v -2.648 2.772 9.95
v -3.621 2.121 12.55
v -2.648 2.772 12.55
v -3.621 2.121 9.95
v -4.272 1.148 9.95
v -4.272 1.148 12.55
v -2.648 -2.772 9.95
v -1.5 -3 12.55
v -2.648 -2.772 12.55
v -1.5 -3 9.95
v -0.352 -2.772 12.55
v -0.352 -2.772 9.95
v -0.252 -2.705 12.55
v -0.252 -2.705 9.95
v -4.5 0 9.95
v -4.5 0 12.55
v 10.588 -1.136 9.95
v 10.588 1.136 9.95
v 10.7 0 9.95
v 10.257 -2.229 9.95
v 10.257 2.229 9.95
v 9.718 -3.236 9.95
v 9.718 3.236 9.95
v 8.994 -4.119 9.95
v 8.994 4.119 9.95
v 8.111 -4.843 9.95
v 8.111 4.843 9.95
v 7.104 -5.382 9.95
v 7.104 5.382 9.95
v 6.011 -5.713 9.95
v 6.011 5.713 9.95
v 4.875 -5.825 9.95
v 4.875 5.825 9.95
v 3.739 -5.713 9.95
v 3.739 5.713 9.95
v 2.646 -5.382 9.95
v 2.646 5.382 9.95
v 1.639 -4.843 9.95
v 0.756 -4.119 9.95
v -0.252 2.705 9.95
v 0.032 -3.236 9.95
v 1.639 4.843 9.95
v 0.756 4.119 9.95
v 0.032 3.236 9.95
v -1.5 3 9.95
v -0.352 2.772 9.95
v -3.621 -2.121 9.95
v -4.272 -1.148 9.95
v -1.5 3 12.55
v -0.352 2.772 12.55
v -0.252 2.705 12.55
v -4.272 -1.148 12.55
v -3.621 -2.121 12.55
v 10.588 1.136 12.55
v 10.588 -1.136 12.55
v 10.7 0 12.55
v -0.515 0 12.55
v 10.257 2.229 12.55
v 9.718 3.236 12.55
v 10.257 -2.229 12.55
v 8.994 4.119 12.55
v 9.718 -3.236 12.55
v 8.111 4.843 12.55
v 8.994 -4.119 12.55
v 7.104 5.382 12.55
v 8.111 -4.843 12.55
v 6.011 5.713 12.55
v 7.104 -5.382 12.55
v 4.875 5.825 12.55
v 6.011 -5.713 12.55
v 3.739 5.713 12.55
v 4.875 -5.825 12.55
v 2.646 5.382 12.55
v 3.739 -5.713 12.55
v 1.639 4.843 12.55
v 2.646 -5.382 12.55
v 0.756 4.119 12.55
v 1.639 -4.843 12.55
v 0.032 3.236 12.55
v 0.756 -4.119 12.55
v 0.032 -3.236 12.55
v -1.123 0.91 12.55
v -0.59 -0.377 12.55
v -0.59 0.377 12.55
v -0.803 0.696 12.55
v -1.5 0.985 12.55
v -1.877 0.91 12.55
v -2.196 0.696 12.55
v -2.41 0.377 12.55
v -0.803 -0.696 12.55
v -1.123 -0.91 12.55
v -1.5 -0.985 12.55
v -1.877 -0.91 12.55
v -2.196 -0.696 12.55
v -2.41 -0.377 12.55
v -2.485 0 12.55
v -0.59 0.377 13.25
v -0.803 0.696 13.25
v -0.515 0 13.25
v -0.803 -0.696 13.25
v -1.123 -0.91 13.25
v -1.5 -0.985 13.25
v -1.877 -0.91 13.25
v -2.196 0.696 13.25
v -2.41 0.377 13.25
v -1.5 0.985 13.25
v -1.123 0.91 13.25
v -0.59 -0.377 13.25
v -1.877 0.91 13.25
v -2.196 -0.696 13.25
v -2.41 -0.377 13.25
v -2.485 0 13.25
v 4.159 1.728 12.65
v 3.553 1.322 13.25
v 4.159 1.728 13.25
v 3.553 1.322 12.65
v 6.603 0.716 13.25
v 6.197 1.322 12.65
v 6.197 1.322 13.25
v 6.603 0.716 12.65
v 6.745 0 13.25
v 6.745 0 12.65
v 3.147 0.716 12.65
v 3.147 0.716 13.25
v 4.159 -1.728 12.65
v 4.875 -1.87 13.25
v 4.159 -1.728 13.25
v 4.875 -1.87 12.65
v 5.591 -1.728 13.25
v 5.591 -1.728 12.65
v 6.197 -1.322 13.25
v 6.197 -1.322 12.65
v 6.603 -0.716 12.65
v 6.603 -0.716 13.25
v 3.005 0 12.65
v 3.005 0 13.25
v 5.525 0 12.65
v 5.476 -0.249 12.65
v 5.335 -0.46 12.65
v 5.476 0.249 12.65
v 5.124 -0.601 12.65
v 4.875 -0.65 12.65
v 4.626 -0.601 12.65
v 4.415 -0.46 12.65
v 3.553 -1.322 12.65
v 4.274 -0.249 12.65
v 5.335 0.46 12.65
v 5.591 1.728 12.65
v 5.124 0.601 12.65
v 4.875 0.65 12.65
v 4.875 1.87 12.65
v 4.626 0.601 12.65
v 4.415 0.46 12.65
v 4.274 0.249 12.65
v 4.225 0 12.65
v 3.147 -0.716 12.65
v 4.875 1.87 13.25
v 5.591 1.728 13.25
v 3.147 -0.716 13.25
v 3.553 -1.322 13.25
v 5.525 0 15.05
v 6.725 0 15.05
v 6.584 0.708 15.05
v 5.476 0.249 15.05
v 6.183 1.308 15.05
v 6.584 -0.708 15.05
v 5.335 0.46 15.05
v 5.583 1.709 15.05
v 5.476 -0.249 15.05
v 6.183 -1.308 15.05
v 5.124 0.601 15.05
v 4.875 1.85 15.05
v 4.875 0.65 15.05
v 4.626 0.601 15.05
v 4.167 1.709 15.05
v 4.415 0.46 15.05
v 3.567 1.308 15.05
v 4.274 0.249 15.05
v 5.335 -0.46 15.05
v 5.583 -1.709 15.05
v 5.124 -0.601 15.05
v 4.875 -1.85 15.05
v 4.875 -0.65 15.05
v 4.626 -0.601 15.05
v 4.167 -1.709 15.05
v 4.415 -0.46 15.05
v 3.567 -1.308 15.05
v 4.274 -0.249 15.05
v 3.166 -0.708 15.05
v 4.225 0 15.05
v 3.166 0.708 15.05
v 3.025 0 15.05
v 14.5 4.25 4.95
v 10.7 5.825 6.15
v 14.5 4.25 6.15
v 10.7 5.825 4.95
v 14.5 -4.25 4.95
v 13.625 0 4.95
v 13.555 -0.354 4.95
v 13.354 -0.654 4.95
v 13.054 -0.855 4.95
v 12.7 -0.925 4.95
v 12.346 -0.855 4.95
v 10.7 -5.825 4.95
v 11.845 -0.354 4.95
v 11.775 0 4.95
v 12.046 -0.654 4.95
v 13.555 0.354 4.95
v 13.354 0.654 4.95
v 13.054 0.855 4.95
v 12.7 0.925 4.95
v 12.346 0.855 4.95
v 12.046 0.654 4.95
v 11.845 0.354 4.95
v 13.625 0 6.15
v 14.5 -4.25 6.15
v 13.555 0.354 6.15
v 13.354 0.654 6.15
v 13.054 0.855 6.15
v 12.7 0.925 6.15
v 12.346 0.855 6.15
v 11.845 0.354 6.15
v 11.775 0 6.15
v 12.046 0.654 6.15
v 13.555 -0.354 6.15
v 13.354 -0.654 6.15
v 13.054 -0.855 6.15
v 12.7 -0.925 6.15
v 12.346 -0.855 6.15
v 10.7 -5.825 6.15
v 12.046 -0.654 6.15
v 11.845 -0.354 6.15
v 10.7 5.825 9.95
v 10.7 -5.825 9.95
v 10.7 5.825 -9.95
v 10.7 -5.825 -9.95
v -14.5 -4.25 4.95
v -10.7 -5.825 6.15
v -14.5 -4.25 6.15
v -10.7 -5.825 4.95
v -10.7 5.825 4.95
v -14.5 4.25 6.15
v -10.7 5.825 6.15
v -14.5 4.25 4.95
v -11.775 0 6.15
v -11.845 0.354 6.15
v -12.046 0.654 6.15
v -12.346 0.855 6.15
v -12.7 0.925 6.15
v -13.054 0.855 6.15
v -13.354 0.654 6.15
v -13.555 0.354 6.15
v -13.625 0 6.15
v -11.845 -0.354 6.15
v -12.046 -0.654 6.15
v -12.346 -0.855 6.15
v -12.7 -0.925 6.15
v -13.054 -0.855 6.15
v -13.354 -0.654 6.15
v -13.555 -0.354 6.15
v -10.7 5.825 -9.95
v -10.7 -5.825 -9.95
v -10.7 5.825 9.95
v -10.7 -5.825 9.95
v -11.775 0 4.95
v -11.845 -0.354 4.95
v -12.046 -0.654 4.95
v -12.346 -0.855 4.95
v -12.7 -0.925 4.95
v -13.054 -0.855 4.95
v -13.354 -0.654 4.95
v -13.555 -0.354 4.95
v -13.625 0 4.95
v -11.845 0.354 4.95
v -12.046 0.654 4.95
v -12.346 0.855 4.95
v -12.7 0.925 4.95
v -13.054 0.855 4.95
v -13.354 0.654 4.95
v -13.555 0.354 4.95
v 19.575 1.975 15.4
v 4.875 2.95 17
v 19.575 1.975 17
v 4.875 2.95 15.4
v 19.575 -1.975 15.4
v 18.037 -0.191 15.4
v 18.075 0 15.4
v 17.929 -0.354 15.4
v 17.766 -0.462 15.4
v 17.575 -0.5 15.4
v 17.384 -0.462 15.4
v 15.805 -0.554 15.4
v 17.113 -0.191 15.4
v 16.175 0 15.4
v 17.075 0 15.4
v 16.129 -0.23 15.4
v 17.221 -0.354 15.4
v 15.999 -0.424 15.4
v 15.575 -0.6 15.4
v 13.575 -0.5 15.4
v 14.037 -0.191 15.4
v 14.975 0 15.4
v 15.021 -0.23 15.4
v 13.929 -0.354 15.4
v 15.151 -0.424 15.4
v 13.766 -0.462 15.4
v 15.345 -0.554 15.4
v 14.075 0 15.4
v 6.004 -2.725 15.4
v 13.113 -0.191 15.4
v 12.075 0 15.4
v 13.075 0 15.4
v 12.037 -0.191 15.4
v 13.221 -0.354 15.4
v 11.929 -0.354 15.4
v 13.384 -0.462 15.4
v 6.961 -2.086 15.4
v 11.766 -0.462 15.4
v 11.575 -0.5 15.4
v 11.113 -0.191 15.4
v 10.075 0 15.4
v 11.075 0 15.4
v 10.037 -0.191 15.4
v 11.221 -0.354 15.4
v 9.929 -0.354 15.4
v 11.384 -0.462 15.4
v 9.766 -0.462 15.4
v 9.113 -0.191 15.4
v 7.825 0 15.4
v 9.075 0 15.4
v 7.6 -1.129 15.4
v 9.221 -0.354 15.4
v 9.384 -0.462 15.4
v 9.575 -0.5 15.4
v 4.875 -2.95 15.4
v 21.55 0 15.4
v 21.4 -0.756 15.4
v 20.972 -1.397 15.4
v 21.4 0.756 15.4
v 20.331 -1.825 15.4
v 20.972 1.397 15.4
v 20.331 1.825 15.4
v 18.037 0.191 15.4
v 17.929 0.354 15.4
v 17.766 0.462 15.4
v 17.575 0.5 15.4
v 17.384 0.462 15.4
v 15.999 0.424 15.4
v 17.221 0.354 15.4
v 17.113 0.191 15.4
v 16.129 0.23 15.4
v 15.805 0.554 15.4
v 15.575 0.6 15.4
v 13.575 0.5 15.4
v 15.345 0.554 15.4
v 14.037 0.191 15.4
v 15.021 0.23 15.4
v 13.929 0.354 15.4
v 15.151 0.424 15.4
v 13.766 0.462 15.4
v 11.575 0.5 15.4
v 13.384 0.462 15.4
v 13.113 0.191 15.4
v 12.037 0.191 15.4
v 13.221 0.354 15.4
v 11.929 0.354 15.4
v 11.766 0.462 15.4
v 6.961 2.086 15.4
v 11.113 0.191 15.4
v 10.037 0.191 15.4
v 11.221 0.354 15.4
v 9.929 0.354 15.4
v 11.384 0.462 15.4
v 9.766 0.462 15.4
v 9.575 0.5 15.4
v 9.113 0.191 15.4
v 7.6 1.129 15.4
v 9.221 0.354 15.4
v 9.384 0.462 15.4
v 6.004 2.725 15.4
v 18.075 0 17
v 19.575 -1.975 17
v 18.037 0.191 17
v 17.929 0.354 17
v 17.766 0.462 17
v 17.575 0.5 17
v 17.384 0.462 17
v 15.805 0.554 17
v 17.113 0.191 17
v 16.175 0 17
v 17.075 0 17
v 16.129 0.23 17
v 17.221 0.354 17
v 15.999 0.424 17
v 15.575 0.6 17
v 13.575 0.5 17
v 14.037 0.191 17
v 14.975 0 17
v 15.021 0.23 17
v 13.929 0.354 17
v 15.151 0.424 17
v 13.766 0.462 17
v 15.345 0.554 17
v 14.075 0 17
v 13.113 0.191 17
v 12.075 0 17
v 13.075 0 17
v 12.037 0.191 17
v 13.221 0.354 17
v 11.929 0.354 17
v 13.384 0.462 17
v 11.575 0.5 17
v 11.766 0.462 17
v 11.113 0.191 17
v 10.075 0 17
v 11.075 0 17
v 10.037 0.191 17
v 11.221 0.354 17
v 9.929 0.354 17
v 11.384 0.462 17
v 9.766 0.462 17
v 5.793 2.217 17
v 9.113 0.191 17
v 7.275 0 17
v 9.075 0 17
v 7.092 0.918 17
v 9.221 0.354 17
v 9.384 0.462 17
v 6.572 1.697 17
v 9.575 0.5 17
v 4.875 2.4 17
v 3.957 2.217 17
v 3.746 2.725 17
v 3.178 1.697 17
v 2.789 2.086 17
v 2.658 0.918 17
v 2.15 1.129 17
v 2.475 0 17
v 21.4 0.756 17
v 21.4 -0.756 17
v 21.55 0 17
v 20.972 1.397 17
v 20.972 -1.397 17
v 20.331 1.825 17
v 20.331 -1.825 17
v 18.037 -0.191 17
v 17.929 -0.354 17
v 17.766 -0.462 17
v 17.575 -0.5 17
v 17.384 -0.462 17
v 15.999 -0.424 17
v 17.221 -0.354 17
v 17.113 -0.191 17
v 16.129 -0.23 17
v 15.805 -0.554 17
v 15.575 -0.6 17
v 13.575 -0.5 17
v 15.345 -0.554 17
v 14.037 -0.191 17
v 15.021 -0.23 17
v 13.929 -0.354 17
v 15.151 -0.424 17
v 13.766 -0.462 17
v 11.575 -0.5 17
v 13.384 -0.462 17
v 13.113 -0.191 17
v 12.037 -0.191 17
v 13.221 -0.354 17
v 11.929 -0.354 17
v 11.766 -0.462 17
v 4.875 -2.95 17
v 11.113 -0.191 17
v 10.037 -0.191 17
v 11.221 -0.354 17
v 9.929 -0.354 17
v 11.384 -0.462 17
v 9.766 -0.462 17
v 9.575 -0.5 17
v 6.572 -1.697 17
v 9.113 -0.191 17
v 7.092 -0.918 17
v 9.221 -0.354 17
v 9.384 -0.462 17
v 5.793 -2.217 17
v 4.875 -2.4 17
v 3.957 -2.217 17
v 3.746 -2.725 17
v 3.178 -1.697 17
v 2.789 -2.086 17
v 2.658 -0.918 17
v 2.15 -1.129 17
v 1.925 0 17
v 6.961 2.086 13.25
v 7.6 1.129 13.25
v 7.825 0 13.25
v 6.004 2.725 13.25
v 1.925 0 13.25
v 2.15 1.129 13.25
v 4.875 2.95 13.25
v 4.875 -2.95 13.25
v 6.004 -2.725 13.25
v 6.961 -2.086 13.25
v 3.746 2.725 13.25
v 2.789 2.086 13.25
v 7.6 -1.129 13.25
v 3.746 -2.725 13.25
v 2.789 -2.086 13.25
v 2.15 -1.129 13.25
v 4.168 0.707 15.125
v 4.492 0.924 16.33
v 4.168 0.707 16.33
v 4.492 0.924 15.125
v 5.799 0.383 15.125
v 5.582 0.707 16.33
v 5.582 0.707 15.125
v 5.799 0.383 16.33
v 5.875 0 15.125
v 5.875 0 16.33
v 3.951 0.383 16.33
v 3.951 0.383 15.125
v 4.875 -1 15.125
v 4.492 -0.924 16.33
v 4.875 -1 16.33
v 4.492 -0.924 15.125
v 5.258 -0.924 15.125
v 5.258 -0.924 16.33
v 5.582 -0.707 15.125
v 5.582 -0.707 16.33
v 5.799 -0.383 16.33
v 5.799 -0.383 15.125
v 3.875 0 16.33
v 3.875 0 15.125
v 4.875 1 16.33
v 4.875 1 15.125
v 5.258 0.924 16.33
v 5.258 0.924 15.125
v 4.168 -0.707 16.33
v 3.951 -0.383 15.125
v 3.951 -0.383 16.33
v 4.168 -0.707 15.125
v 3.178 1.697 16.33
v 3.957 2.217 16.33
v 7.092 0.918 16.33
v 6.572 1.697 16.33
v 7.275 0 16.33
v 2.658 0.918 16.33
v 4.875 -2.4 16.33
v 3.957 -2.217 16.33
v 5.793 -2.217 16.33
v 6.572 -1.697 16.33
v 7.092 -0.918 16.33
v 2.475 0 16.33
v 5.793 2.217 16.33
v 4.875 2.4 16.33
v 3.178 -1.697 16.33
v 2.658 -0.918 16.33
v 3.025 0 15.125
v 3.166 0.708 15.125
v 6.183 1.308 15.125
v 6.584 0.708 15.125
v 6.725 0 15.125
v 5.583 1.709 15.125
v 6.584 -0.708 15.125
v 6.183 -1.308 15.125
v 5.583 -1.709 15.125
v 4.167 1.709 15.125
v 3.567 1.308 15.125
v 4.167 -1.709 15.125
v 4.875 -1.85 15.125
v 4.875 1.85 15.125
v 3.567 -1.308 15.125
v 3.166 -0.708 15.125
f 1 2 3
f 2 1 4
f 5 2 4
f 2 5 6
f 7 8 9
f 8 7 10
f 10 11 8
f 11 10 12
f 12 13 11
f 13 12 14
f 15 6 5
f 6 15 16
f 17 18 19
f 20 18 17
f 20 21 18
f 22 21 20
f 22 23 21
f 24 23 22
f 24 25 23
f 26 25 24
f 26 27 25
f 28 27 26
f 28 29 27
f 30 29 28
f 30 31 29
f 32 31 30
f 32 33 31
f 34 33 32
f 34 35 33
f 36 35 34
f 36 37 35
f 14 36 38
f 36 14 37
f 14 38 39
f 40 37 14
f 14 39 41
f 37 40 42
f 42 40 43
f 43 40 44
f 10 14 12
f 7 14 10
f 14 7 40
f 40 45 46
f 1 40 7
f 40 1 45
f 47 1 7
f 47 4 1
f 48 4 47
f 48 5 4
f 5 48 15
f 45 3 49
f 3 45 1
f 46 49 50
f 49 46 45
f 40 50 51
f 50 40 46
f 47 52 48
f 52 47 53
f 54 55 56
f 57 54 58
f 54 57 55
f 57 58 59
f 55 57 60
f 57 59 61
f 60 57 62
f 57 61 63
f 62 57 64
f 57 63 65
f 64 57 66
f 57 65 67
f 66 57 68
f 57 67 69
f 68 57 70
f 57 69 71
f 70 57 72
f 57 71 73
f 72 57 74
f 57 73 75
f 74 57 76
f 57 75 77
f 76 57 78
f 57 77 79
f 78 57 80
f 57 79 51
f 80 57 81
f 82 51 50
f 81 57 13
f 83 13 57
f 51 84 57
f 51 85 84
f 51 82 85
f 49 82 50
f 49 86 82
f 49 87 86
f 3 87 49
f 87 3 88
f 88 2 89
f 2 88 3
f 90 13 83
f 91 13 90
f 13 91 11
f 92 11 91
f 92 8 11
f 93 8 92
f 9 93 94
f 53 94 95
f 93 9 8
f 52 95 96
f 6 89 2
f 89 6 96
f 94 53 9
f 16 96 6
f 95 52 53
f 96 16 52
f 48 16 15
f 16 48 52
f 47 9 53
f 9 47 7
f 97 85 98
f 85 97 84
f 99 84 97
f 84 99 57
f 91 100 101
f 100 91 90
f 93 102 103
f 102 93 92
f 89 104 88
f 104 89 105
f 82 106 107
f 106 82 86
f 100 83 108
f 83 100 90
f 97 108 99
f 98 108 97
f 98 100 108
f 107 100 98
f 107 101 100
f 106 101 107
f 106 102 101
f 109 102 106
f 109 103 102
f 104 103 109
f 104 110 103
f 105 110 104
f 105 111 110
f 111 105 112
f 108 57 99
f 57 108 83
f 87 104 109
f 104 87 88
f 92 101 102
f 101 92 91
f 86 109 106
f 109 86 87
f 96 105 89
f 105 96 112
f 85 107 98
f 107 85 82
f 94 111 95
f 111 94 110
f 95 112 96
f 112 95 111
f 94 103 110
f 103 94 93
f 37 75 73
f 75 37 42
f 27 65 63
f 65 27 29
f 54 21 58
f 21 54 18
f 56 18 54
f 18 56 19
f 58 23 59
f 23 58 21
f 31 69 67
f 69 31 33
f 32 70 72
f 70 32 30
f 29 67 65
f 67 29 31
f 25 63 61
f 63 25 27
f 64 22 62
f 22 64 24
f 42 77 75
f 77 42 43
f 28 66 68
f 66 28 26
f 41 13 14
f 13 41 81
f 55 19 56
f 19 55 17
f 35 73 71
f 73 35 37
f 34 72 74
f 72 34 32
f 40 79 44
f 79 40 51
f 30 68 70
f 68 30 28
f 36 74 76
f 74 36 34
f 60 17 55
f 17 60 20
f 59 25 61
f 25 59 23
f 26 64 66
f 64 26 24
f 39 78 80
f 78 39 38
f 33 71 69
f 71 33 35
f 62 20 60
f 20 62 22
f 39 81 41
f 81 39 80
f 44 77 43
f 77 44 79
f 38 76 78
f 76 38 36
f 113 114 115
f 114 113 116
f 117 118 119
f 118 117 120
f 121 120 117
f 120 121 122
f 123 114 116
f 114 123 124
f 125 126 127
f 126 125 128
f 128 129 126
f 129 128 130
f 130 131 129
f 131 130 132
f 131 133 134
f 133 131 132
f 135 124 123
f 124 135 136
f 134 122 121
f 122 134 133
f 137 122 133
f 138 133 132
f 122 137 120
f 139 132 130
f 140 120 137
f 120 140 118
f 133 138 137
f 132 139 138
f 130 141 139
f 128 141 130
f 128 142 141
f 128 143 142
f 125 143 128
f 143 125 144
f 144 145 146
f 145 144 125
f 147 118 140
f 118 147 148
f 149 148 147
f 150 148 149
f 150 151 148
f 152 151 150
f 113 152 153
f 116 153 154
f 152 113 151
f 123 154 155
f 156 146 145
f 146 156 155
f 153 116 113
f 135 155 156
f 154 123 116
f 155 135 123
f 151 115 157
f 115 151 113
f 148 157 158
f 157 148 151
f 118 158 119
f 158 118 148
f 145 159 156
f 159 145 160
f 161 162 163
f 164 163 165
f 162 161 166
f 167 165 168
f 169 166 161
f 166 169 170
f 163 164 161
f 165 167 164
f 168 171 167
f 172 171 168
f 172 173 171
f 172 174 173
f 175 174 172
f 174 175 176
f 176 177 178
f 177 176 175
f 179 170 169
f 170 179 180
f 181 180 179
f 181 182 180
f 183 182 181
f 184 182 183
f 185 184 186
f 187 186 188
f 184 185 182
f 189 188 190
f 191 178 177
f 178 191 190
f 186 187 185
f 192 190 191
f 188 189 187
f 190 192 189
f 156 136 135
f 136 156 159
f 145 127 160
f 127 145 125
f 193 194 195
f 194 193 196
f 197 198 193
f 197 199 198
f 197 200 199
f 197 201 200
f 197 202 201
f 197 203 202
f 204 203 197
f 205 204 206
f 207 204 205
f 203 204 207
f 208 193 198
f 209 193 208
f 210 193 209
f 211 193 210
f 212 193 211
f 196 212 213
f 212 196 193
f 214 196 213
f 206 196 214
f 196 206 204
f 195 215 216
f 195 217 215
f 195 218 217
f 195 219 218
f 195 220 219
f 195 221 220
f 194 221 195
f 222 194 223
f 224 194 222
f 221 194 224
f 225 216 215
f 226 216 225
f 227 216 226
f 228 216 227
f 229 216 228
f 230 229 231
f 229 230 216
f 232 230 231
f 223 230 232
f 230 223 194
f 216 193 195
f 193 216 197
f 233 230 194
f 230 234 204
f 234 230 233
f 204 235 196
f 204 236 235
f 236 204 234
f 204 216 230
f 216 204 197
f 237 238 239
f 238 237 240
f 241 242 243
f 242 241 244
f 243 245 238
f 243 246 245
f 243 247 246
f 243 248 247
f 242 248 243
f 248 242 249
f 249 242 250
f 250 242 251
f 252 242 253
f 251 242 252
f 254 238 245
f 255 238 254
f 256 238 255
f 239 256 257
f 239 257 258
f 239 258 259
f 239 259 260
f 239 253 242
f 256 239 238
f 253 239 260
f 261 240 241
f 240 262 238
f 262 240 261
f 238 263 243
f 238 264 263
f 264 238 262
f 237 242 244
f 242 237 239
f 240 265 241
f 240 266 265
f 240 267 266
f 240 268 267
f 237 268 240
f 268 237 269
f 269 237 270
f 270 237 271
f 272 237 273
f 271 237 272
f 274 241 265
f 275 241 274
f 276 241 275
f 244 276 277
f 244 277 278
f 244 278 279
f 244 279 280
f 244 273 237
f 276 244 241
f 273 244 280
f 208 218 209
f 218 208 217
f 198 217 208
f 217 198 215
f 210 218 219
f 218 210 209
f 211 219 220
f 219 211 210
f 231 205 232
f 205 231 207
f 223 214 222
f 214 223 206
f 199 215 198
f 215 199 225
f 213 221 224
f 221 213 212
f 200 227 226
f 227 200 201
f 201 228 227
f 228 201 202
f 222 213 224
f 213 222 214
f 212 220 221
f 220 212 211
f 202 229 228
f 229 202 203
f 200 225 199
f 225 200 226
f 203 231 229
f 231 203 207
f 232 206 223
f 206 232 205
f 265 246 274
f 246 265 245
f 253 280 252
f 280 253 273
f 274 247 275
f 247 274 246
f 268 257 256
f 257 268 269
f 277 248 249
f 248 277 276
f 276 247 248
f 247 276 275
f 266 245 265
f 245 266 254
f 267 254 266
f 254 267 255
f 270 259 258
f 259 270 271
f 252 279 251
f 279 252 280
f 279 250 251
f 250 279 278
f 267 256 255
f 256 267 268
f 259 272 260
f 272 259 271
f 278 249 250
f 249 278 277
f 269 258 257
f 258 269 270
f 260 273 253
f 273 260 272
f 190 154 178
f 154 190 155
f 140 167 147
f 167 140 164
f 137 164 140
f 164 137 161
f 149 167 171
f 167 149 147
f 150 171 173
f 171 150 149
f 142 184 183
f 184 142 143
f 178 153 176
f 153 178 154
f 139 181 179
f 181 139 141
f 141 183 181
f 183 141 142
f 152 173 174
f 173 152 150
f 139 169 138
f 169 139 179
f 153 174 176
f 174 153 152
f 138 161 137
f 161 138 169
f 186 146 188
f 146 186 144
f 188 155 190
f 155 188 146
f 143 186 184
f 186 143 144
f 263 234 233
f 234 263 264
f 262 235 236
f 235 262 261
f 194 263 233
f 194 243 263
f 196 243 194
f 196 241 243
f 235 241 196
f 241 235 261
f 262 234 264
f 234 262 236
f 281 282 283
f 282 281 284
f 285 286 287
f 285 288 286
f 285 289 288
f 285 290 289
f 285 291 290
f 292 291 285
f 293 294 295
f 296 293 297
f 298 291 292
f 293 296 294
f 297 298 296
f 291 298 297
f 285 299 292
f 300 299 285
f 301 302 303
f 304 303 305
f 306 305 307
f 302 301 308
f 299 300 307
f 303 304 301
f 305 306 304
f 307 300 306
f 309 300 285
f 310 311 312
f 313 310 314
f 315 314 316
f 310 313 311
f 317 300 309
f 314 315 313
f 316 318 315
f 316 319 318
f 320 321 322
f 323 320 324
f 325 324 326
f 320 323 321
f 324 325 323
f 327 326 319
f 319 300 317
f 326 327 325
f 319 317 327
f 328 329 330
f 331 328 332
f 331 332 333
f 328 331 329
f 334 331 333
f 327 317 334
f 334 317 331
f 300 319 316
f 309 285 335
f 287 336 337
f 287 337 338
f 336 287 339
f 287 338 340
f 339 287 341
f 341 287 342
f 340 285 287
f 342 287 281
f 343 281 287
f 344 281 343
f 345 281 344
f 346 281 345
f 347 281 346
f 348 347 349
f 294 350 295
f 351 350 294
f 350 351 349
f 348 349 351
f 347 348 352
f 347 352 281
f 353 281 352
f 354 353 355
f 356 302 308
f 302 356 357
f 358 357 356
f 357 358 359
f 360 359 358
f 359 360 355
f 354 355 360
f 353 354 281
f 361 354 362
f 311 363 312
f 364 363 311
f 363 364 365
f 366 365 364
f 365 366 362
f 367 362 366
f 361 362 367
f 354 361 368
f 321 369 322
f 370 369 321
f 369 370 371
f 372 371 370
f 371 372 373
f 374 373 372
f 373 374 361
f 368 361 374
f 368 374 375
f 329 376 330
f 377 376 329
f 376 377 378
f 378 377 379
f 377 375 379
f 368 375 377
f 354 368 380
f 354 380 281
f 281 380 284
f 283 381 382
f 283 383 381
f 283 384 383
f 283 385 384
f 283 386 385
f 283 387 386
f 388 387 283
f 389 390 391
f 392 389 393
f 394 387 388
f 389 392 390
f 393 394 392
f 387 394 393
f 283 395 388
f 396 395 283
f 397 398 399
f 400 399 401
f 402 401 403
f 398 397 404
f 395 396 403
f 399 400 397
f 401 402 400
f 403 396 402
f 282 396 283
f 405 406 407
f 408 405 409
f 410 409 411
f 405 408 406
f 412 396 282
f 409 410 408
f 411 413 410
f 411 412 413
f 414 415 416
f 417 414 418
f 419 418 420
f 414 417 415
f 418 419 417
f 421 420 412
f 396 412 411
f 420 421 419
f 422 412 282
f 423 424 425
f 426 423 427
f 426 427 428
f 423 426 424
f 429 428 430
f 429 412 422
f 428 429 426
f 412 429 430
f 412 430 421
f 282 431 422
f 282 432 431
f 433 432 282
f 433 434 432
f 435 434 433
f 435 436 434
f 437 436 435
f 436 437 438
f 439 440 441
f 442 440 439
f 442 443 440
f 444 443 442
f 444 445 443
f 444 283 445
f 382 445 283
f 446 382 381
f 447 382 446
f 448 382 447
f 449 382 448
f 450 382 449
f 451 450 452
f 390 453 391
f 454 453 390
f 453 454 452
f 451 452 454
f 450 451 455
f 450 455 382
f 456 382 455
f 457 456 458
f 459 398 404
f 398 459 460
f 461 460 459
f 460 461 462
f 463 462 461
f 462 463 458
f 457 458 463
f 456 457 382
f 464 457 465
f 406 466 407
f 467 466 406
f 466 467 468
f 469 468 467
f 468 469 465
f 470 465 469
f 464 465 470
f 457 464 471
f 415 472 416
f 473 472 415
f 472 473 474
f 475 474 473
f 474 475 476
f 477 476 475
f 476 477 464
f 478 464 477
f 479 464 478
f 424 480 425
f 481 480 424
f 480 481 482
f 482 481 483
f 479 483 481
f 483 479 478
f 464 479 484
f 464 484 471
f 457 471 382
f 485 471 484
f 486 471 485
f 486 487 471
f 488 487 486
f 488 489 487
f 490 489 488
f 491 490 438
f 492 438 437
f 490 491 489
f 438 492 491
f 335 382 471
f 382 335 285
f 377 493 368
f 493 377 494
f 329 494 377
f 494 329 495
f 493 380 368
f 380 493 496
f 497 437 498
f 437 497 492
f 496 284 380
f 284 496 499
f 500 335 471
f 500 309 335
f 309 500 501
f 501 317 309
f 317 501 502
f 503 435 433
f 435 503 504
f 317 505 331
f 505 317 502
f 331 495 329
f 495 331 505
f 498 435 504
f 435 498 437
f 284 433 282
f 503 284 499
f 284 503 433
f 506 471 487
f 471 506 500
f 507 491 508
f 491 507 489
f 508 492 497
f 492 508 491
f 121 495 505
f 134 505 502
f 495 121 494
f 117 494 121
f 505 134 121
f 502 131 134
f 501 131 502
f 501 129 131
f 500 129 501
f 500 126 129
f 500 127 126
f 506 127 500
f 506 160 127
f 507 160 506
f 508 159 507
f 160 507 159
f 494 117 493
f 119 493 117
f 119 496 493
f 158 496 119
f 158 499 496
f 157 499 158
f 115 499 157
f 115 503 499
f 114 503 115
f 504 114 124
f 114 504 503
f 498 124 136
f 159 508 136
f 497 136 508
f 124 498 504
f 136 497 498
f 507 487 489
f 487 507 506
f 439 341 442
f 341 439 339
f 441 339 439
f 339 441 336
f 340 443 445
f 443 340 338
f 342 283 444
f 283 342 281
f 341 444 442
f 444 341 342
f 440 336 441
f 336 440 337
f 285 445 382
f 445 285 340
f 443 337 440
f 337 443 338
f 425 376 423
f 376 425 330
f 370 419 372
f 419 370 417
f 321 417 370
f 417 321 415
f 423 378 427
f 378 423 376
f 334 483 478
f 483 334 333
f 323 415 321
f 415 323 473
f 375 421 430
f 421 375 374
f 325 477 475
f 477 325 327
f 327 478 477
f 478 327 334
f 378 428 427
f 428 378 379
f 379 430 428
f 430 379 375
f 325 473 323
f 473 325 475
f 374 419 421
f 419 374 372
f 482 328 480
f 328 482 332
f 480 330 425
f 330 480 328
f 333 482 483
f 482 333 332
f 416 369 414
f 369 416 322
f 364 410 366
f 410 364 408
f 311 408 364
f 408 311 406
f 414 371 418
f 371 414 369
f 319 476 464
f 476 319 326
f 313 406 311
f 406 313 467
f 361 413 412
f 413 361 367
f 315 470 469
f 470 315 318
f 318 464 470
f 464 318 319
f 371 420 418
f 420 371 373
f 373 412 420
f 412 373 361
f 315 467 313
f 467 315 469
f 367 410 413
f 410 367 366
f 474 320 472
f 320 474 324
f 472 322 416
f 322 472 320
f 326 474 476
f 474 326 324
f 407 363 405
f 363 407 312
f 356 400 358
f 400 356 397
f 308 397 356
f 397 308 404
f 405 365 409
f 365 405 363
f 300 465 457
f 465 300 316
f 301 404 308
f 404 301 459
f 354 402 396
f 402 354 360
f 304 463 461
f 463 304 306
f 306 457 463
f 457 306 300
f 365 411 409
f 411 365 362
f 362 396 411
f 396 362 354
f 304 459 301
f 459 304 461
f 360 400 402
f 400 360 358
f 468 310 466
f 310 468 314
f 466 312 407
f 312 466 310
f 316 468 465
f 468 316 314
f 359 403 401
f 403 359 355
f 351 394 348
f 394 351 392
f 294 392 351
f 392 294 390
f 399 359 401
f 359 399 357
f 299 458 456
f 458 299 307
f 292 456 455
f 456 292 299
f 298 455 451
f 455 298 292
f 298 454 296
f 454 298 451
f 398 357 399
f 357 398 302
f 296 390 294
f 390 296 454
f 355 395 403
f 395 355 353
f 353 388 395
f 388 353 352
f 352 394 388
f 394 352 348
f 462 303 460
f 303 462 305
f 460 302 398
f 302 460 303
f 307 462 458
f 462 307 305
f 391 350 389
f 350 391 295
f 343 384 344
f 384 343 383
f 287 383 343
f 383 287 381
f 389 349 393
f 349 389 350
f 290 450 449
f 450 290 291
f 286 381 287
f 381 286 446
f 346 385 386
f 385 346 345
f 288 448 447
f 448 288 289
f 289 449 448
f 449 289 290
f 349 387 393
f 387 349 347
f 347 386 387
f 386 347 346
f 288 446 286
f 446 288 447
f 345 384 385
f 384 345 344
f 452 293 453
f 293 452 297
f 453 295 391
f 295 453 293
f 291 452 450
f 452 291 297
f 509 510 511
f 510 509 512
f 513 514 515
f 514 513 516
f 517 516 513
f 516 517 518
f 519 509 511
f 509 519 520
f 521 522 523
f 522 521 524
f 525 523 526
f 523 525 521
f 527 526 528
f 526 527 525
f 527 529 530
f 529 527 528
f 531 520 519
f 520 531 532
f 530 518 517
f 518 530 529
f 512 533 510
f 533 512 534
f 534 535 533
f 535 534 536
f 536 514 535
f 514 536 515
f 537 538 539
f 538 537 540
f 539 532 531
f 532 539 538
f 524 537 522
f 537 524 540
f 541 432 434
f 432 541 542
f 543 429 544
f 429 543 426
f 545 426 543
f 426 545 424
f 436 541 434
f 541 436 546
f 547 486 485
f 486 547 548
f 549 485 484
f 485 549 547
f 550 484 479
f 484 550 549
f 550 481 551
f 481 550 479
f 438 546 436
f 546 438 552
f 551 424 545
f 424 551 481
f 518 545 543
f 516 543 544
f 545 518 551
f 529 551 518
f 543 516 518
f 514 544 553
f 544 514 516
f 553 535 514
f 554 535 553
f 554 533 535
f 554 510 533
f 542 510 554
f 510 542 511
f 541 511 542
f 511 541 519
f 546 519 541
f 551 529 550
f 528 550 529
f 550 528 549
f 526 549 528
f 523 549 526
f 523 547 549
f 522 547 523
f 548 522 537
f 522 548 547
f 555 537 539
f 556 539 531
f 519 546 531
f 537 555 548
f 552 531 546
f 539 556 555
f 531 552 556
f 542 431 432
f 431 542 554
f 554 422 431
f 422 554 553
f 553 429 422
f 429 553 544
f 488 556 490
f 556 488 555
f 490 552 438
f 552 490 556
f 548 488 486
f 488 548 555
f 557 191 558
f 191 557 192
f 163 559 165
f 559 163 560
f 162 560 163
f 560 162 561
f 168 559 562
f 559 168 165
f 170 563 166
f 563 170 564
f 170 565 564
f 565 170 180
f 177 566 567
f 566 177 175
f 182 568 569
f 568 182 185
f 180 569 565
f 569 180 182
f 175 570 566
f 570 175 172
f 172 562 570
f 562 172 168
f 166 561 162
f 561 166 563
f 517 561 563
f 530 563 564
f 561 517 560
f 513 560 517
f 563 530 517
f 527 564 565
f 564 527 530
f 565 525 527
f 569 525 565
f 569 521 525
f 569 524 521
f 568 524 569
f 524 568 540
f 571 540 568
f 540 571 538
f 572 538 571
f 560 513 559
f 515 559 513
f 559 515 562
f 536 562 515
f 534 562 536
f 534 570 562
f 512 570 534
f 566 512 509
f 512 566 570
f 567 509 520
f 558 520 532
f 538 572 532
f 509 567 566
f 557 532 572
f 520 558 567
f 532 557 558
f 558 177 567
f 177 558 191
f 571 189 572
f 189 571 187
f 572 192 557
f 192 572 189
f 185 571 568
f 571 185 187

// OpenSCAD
// file: ../utils.scad
// http://forum.openscad.org/Creating-pie-pizza-slice-shape-need-a-dynamic-length-array-td3148.html

module pie_slice(r, start_angle, end_angle, radial_resolution) {
    R = r * sqrt(2) + 1;
    a0 = (4 * start_angle + 0 * end_angle) / 4;
    a1 = (3 * start_angle + 1 * end_angle) / 4;
    a2 = (2 * start_angle + 2 * end_angle) / 4;
    a3 = (1 * start_angle + 3 * end_angle) / 4;
    a4 = (0 * start_angle + 4 * end_angle) / 4;
    if(end_angle > start_angle)
        intersection() {
        circle(r, $fn);
        polygon([
            [0,0],
            [R * cos(a0), R * sin(a0)],
            [R * cos(a1), R * sin(a1)],
            [R * cos(a2), R * sin(a2)],
            [R * cos(a3), R * sin(a3)],
            [R * cos(a4), R * sin(a4)],
            [0,0]
       ]);
    }
}

// https://github.com/openscad/openscad/issues/29

module rotate_about(v,a) {
	translate(v) rotate(a) translate(-v) children(0);
}

// https://github.com/robofun/openscad-utils/blob/master/trapezoid.scad

module trapezoid(width_base, width_top,height,thickness) {
	

  linear_extrude(height = thickness) polygon(points=[[0,0],[width_base,0],[width_base-(width_base-width_top)/2,height],[(width_base-width_top)/2,height]], paths=[[0,1,2,3]]); 
  
}
// main file
// Author Michael Marques (DrYerzinia)

use <../utils.scad>

module ls_0006_servo(){
	
	length = 21.4;
	depth = 19.9;
	thickness = 11.65;

	gear_height = 2.6;
	gear_bump_height = 0.7;
	gear_bump_diameter = 1.97;
	gear_outer_bump_diameter = 6;
	gear_bump_offset = 12.2;

	shaft_height = 2.4;
	shaft_diameter = 3.74;
	shaft_offset = thickness / 2;
	shaft_screw_diameter = 1.3;
	
	wing_outer_width = 8.5;
	wing_top_off = 3.8;
	wing_length = 3.8;
	wing_thickness = 1.2;
	wing_hole_diameter = 1.85;
	wing_hole_edge_dist = 2;

	module wing_hole(){
		translate(
			[
				length / 2 + wing_hole_edge_dist,
				0,
				depth/2 - wing_top_off - wing_thickness / 2
			])
			cylinder(
				h = wing_thickness + 1,
				r = wing_hole_diameter / 2,
				$fn = 16,
				center = true);
	}

	module wing(){
		translate(
			[
				length / 2,
				thickness / 2,
				depth/2 - wing_top_off - wing_thickness
			])
			rotate([0,0,-90])
				trapezoid(
					thickness,
					wing_outer_width,
					wing_length,
					wing_thickness);
	}

	// Body
	cube([length, thickness, depth], center = true);

	difference(){
		union(){

			wing();
			mirror() wing();

			// Gear Bumps
			translate([0, 0, depth/2 + gear_height / 2]){
				translate([length / 2 - gear_bump_offset, 0, 0])
					cylinder(
						h = gear_height,
						r = gear_outer_bump_diameter / 2,
						$fn = 16,
						center = true);
				translate([length / 2 - gear_bump_offset, 0, gear_height/2 + gear_bump_height / 2])
					cylinder(
						h = gear_bump_height,
						r = gear_bump_diameter / 2,
						$fn = 16,
						center = true);
				translate([length / 2 - shaft_offset, 0, 0])
					cylinder(
						h = gear_height,
						r = thickness / 2,
						$fn = 32,
						center = true);
				// Shaft
				translate([length / 2 - shaft_offset, 0, gear_height])
					cylinder(
						h = shaft_height,
						r = shaft_diameter / 2,
						$fn = 16,
						center = true);
			}

		}
		union(){

			wing_hole();
			mirror() wing_hole();

			// Shaft_hole
			translate(
				[
					length / 2 - shaft_offset,
					0,
					depth/2 + gear_height * (3 / 2) + 0.5])
				cylinder(
					h = shaft_height + 1,
					r = shaft_screw_diameter / 2,
					$fn = 16,
					center = true);

		}
	}

}

module translate_ls_0006_attachment(){

	length = 21.4;
	thickness = 11.65;
	shaft_offset = thickness / 2;
	depth = 19.9;
	float = 3.3;

	translate([length / 2 - shaft_offset, 0, depth / 2 + float])
		children();

}

module bar_attachment(){

	height = 3.75;
	bar_length = 14.7;
	bar_thickness = 1.6;
	inner_radius = 5.9;
	outer_radius = 3.95;
	shaft_diameter = 3.7;
	upper_void_diameter = 4.8;
	screw_diameter = 2;
	hole_spacing = 2;
	hole_4_diameter = 1.2;
	hole_diameter = 1;
	hole_start_off = 4.7;
	top_void_depth = 0.67;
	bottom_void_depth = 1.84;

	translate([0, 0, height / 2]){
		difference(){
			union(){

				translate([0, inner_radius / 2, height / 2 - bar_thickness])
					rotate([0,0,-90])
						trapezoid(
							inner_radius,
							outer_radius,
							bar_length,
							bar_thickness);

				cylinder(
					h = height,
					r = inner_radius / 2,
					$fn = 16,
					center = true);

				translate([bar_length, 0, height / 2 - bar_thickness / 2])
					cylinder(
						h = bar_thickness,
						r = outer_radius / 2,
						$fn = 16,
						center = true);

			}
			union(){
				// screwhole
				cylinder(
					h = height + 1,
					r = screw_diameter / 2,
					$fn = 16,
					center = true);
				// voids
				translate([0, 0, height / 2 - top_void_depth / 2 + 0.5])
					cylinder(
						h = top_void_depth + 1,
						r = upper_void_diameter / 2,
						$fn = 16,
						center = true);
				translate([0, 0,  - bottom_void_depth / 2 - 0.5])
					cylinder(
						h = bottom_void_depth + 1,
						r = shaft_diameter / 2,
						$fn = 16,
						center = true);

				for(i = [0:4]){
					dia = (i != 3) ? hole_diameter : hole_4_diameter;
					translate(
						[
							hole_start_off + hole_spacing * i,
							0,
							height / 2 - bar_thickness / 2])
						cylinder(
							h = bar_thickness + 1,
							r = dia / 2,
							$fn = 16,
							center = true);
				}

			}
		}
	}

}

ls_0006_servo();
translate_ls_0006_attachment() bar_attachment();
